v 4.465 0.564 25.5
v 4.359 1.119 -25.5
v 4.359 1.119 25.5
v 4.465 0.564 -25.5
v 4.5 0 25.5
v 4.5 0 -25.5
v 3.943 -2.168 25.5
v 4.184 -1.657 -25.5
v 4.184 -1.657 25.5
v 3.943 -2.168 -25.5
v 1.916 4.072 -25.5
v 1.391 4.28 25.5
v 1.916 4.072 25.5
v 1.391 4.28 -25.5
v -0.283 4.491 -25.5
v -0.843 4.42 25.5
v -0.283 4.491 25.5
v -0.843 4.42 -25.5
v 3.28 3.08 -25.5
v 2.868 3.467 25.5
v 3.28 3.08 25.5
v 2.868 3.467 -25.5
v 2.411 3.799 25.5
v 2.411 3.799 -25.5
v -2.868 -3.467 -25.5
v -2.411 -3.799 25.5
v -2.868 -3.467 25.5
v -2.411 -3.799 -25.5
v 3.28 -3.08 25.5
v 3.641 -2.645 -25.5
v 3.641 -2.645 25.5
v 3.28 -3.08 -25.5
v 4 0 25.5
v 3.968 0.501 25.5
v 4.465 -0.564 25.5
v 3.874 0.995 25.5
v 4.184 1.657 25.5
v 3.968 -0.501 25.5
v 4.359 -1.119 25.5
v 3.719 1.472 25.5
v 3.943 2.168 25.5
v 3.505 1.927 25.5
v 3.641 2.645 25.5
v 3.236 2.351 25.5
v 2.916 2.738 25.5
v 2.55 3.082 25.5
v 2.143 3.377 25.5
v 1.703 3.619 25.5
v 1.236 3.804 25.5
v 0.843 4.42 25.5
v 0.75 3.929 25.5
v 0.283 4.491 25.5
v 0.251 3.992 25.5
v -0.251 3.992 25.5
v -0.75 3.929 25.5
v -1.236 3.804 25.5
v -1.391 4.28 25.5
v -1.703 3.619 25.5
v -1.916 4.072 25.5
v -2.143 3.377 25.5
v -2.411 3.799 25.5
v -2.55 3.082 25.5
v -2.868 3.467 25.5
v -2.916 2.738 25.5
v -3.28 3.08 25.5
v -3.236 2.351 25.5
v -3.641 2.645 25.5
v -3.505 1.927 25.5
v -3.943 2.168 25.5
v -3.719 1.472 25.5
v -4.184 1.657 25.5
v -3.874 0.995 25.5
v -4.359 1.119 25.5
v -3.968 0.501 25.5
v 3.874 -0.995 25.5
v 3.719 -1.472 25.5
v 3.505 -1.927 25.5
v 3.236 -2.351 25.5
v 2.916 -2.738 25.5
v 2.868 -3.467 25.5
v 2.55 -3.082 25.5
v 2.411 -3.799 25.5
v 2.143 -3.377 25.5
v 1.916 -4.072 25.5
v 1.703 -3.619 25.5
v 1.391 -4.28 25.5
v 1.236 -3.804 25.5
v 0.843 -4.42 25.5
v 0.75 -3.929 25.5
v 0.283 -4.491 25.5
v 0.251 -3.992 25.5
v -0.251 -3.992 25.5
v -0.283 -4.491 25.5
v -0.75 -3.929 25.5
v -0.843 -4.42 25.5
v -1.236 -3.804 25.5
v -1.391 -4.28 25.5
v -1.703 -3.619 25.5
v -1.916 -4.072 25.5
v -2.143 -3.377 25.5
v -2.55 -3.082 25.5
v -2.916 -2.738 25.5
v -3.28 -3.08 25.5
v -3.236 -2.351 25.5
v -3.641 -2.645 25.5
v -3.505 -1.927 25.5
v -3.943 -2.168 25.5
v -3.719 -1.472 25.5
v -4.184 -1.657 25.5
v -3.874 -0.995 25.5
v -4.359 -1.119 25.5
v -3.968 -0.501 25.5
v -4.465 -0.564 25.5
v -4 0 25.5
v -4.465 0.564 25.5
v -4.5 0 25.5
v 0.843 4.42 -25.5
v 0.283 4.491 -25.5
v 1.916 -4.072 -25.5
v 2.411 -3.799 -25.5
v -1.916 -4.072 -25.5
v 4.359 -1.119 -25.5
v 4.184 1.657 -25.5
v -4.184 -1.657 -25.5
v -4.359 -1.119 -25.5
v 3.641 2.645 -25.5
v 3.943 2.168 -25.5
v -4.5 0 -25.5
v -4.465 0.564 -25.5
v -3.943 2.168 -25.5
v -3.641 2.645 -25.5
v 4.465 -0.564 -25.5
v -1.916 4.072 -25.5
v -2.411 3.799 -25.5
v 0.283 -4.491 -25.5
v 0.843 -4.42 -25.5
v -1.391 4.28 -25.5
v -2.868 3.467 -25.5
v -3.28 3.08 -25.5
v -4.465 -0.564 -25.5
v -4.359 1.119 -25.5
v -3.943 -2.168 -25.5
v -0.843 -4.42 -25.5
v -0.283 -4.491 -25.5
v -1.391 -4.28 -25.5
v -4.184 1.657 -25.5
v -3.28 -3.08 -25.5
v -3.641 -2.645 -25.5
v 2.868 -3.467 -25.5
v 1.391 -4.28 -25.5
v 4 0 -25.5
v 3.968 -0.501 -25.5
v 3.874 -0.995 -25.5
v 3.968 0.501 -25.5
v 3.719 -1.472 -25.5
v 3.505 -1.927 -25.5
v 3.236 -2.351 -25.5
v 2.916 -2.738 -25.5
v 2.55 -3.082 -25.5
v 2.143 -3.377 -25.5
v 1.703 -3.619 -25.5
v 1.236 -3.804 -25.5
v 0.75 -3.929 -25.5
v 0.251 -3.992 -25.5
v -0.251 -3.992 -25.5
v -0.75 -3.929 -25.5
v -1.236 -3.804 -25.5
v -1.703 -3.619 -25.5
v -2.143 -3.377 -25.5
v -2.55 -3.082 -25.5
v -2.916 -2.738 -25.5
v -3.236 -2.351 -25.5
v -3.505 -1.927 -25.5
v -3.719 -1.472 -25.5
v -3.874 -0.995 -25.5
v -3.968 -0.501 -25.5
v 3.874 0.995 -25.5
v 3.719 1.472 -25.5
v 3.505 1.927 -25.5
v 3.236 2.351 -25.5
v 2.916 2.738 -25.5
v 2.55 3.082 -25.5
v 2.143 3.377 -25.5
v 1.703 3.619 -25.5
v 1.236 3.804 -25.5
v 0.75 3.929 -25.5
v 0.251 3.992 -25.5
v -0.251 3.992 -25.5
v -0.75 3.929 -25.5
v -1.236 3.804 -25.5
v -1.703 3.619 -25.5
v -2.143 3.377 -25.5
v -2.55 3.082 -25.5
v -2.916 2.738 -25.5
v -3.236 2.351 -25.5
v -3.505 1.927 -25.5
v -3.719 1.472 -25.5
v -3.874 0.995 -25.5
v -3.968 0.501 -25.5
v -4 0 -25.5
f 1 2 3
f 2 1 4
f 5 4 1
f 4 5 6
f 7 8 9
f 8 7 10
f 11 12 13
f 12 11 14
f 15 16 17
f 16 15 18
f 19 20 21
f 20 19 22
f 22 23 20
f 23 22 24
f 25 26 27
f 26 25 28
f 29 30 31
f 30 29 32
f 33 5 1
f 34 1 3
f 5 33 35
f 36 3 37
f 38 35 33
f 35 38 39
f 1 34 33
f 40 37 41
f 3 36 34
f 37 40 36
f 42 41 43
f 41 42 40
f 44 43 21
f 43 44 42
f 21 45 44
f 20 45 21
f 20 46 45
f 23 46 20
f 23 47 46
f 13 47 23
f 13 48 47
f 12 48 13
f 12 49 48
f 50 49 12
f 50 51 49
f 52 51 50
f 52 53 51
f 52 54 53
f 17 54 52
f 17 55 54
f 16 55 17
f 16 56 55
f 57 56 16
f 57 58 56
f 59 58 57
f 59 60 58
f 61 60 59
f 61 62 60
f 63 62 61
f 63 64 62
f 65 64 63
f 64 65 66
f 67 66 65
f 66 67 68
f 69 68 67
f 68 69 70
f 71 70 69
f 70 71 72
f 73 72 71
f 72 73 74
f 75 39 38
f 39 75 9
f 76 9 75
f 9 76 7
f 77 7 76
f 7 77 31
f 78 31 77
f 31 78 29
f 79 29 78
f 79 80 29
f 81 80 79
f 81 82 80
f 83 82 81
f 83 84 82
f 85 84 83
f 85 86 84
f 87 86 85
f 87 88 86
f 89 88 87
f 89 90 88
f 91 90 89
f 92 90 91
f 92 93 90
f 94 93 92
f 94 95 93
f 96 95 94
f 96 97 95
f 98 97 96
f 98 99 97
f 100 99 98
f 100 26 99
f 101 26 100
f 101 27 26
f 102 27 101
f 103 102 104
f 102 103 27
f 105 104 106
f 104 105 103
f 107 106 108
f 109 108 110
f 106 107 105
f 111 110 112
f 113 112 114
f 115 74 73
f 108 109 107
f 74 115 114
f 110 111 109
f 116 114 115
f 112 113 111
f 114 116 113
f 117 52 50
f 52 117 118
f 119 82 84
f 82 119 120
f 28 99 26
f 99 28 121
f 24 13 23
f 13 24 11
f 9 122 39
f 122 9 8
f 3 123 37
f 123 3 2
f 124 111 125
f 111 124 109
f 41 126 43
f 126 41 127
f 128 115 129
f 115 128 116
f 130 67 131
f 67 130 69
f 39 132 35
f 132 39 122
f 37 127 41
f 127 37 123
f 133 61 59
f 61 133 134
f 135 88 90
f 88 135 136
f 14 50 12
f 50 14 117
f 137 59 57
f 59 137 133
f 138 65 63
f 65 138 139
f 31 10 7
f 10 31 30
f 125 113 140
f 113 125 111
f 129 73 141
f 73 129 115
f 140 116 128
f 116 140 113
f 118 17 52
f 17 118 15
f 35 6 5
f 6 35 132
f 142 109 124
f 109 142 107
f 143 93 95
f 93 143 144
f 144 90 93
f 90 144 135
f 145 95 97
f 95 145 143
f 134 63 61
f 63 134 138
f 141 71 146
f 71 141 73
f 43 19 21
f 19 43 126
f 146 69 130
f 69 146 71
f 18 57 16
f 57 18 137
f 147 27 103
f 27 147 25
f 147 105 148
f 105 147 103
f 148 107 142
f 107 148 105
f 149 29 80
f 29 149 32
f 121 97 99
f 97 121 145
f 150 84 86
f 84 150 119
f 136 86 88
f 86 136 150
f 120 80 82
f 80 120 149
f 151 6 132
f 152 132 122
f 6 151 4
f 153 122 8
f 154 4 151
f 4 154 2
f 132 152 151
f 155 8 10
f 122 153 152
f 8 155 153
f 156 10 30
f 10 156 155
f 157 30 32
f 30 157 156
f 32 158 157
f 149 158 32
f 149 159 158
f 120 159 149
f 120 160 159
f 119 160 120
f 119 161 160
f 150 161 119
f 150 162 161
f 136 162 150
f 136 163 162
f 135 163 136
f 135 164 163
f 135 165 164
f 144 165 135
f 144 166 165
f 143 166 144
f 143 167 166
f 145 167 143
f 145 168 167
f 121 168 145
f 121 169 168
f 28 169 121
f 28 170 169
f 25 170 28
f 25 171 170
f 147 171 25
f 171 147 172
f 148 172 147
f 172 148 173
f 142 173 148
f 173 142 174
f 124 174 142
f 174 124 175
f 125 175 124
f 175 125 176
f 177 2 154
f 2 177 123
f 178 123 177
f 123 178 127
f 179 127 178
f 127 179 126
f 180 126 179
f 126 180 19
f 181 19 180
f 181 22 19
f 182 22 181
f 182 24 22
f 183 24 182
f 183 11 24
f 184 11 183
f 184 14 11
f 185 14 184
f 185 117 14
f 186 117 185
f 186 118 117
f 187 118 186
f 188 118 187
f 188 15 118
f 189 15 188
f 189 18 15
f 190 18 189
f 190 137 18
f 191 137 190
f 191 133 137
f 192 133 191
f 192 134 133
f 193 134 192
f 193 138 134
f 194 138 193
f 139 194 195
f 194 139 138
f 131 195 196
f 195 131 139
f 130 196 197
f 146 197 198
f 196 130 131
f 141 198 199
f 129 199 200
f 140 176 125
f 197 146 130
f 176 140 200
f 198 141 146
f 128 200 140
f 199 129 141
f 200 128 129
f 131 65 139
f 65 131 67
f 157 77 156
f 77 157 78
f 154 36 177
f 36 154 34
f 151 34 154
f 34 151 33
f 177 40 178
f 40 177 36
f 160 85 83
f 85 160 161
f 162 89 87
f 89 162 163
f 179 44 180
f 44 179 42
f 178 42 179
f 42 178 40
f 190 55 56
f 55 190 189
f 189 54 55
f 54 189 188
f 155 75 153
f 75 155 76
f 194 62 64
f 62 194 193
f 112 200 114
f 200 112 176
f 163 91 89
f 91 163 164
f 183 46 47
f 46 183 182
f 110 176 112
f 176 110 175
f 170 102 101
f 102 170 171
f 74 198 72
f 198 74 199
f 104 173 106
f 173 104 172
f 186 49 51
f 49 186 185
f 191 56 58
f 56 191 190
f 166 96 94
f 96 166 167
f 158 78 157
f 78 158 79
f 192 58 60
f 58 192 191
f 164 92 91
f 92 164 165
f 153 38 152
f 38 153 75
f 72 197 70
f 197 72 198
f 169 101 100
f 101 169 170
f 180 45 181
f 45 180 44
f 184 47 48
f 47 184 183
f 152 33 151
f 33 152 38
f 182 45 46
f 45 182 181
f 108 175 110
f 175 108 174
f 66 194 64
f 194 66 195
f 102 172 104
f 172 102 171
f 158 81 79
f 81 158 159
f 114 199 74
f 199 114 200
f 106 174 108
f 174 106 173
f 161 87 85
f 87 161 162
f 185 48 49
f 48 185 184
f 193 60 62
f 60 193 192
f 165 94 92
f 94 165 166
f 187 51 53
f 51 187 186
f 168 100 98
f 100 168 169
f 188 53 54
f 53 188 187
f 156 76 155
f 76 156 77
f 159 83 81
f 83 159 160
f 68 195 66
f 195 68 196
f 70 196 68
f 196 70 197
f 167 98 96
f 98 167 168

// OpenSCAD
$fn = 50;


difference() {
	union() {
		translate(v = [0, 0, -25.5000000000]) {
			cylinder(h = 51, r = 4.5000000000);
		}
	}
	union() {
		translate(v = [0, 0, -100.0000000000]) {
			cylinder(h = 200, r = 4.0000000000);
		}
	}
}
